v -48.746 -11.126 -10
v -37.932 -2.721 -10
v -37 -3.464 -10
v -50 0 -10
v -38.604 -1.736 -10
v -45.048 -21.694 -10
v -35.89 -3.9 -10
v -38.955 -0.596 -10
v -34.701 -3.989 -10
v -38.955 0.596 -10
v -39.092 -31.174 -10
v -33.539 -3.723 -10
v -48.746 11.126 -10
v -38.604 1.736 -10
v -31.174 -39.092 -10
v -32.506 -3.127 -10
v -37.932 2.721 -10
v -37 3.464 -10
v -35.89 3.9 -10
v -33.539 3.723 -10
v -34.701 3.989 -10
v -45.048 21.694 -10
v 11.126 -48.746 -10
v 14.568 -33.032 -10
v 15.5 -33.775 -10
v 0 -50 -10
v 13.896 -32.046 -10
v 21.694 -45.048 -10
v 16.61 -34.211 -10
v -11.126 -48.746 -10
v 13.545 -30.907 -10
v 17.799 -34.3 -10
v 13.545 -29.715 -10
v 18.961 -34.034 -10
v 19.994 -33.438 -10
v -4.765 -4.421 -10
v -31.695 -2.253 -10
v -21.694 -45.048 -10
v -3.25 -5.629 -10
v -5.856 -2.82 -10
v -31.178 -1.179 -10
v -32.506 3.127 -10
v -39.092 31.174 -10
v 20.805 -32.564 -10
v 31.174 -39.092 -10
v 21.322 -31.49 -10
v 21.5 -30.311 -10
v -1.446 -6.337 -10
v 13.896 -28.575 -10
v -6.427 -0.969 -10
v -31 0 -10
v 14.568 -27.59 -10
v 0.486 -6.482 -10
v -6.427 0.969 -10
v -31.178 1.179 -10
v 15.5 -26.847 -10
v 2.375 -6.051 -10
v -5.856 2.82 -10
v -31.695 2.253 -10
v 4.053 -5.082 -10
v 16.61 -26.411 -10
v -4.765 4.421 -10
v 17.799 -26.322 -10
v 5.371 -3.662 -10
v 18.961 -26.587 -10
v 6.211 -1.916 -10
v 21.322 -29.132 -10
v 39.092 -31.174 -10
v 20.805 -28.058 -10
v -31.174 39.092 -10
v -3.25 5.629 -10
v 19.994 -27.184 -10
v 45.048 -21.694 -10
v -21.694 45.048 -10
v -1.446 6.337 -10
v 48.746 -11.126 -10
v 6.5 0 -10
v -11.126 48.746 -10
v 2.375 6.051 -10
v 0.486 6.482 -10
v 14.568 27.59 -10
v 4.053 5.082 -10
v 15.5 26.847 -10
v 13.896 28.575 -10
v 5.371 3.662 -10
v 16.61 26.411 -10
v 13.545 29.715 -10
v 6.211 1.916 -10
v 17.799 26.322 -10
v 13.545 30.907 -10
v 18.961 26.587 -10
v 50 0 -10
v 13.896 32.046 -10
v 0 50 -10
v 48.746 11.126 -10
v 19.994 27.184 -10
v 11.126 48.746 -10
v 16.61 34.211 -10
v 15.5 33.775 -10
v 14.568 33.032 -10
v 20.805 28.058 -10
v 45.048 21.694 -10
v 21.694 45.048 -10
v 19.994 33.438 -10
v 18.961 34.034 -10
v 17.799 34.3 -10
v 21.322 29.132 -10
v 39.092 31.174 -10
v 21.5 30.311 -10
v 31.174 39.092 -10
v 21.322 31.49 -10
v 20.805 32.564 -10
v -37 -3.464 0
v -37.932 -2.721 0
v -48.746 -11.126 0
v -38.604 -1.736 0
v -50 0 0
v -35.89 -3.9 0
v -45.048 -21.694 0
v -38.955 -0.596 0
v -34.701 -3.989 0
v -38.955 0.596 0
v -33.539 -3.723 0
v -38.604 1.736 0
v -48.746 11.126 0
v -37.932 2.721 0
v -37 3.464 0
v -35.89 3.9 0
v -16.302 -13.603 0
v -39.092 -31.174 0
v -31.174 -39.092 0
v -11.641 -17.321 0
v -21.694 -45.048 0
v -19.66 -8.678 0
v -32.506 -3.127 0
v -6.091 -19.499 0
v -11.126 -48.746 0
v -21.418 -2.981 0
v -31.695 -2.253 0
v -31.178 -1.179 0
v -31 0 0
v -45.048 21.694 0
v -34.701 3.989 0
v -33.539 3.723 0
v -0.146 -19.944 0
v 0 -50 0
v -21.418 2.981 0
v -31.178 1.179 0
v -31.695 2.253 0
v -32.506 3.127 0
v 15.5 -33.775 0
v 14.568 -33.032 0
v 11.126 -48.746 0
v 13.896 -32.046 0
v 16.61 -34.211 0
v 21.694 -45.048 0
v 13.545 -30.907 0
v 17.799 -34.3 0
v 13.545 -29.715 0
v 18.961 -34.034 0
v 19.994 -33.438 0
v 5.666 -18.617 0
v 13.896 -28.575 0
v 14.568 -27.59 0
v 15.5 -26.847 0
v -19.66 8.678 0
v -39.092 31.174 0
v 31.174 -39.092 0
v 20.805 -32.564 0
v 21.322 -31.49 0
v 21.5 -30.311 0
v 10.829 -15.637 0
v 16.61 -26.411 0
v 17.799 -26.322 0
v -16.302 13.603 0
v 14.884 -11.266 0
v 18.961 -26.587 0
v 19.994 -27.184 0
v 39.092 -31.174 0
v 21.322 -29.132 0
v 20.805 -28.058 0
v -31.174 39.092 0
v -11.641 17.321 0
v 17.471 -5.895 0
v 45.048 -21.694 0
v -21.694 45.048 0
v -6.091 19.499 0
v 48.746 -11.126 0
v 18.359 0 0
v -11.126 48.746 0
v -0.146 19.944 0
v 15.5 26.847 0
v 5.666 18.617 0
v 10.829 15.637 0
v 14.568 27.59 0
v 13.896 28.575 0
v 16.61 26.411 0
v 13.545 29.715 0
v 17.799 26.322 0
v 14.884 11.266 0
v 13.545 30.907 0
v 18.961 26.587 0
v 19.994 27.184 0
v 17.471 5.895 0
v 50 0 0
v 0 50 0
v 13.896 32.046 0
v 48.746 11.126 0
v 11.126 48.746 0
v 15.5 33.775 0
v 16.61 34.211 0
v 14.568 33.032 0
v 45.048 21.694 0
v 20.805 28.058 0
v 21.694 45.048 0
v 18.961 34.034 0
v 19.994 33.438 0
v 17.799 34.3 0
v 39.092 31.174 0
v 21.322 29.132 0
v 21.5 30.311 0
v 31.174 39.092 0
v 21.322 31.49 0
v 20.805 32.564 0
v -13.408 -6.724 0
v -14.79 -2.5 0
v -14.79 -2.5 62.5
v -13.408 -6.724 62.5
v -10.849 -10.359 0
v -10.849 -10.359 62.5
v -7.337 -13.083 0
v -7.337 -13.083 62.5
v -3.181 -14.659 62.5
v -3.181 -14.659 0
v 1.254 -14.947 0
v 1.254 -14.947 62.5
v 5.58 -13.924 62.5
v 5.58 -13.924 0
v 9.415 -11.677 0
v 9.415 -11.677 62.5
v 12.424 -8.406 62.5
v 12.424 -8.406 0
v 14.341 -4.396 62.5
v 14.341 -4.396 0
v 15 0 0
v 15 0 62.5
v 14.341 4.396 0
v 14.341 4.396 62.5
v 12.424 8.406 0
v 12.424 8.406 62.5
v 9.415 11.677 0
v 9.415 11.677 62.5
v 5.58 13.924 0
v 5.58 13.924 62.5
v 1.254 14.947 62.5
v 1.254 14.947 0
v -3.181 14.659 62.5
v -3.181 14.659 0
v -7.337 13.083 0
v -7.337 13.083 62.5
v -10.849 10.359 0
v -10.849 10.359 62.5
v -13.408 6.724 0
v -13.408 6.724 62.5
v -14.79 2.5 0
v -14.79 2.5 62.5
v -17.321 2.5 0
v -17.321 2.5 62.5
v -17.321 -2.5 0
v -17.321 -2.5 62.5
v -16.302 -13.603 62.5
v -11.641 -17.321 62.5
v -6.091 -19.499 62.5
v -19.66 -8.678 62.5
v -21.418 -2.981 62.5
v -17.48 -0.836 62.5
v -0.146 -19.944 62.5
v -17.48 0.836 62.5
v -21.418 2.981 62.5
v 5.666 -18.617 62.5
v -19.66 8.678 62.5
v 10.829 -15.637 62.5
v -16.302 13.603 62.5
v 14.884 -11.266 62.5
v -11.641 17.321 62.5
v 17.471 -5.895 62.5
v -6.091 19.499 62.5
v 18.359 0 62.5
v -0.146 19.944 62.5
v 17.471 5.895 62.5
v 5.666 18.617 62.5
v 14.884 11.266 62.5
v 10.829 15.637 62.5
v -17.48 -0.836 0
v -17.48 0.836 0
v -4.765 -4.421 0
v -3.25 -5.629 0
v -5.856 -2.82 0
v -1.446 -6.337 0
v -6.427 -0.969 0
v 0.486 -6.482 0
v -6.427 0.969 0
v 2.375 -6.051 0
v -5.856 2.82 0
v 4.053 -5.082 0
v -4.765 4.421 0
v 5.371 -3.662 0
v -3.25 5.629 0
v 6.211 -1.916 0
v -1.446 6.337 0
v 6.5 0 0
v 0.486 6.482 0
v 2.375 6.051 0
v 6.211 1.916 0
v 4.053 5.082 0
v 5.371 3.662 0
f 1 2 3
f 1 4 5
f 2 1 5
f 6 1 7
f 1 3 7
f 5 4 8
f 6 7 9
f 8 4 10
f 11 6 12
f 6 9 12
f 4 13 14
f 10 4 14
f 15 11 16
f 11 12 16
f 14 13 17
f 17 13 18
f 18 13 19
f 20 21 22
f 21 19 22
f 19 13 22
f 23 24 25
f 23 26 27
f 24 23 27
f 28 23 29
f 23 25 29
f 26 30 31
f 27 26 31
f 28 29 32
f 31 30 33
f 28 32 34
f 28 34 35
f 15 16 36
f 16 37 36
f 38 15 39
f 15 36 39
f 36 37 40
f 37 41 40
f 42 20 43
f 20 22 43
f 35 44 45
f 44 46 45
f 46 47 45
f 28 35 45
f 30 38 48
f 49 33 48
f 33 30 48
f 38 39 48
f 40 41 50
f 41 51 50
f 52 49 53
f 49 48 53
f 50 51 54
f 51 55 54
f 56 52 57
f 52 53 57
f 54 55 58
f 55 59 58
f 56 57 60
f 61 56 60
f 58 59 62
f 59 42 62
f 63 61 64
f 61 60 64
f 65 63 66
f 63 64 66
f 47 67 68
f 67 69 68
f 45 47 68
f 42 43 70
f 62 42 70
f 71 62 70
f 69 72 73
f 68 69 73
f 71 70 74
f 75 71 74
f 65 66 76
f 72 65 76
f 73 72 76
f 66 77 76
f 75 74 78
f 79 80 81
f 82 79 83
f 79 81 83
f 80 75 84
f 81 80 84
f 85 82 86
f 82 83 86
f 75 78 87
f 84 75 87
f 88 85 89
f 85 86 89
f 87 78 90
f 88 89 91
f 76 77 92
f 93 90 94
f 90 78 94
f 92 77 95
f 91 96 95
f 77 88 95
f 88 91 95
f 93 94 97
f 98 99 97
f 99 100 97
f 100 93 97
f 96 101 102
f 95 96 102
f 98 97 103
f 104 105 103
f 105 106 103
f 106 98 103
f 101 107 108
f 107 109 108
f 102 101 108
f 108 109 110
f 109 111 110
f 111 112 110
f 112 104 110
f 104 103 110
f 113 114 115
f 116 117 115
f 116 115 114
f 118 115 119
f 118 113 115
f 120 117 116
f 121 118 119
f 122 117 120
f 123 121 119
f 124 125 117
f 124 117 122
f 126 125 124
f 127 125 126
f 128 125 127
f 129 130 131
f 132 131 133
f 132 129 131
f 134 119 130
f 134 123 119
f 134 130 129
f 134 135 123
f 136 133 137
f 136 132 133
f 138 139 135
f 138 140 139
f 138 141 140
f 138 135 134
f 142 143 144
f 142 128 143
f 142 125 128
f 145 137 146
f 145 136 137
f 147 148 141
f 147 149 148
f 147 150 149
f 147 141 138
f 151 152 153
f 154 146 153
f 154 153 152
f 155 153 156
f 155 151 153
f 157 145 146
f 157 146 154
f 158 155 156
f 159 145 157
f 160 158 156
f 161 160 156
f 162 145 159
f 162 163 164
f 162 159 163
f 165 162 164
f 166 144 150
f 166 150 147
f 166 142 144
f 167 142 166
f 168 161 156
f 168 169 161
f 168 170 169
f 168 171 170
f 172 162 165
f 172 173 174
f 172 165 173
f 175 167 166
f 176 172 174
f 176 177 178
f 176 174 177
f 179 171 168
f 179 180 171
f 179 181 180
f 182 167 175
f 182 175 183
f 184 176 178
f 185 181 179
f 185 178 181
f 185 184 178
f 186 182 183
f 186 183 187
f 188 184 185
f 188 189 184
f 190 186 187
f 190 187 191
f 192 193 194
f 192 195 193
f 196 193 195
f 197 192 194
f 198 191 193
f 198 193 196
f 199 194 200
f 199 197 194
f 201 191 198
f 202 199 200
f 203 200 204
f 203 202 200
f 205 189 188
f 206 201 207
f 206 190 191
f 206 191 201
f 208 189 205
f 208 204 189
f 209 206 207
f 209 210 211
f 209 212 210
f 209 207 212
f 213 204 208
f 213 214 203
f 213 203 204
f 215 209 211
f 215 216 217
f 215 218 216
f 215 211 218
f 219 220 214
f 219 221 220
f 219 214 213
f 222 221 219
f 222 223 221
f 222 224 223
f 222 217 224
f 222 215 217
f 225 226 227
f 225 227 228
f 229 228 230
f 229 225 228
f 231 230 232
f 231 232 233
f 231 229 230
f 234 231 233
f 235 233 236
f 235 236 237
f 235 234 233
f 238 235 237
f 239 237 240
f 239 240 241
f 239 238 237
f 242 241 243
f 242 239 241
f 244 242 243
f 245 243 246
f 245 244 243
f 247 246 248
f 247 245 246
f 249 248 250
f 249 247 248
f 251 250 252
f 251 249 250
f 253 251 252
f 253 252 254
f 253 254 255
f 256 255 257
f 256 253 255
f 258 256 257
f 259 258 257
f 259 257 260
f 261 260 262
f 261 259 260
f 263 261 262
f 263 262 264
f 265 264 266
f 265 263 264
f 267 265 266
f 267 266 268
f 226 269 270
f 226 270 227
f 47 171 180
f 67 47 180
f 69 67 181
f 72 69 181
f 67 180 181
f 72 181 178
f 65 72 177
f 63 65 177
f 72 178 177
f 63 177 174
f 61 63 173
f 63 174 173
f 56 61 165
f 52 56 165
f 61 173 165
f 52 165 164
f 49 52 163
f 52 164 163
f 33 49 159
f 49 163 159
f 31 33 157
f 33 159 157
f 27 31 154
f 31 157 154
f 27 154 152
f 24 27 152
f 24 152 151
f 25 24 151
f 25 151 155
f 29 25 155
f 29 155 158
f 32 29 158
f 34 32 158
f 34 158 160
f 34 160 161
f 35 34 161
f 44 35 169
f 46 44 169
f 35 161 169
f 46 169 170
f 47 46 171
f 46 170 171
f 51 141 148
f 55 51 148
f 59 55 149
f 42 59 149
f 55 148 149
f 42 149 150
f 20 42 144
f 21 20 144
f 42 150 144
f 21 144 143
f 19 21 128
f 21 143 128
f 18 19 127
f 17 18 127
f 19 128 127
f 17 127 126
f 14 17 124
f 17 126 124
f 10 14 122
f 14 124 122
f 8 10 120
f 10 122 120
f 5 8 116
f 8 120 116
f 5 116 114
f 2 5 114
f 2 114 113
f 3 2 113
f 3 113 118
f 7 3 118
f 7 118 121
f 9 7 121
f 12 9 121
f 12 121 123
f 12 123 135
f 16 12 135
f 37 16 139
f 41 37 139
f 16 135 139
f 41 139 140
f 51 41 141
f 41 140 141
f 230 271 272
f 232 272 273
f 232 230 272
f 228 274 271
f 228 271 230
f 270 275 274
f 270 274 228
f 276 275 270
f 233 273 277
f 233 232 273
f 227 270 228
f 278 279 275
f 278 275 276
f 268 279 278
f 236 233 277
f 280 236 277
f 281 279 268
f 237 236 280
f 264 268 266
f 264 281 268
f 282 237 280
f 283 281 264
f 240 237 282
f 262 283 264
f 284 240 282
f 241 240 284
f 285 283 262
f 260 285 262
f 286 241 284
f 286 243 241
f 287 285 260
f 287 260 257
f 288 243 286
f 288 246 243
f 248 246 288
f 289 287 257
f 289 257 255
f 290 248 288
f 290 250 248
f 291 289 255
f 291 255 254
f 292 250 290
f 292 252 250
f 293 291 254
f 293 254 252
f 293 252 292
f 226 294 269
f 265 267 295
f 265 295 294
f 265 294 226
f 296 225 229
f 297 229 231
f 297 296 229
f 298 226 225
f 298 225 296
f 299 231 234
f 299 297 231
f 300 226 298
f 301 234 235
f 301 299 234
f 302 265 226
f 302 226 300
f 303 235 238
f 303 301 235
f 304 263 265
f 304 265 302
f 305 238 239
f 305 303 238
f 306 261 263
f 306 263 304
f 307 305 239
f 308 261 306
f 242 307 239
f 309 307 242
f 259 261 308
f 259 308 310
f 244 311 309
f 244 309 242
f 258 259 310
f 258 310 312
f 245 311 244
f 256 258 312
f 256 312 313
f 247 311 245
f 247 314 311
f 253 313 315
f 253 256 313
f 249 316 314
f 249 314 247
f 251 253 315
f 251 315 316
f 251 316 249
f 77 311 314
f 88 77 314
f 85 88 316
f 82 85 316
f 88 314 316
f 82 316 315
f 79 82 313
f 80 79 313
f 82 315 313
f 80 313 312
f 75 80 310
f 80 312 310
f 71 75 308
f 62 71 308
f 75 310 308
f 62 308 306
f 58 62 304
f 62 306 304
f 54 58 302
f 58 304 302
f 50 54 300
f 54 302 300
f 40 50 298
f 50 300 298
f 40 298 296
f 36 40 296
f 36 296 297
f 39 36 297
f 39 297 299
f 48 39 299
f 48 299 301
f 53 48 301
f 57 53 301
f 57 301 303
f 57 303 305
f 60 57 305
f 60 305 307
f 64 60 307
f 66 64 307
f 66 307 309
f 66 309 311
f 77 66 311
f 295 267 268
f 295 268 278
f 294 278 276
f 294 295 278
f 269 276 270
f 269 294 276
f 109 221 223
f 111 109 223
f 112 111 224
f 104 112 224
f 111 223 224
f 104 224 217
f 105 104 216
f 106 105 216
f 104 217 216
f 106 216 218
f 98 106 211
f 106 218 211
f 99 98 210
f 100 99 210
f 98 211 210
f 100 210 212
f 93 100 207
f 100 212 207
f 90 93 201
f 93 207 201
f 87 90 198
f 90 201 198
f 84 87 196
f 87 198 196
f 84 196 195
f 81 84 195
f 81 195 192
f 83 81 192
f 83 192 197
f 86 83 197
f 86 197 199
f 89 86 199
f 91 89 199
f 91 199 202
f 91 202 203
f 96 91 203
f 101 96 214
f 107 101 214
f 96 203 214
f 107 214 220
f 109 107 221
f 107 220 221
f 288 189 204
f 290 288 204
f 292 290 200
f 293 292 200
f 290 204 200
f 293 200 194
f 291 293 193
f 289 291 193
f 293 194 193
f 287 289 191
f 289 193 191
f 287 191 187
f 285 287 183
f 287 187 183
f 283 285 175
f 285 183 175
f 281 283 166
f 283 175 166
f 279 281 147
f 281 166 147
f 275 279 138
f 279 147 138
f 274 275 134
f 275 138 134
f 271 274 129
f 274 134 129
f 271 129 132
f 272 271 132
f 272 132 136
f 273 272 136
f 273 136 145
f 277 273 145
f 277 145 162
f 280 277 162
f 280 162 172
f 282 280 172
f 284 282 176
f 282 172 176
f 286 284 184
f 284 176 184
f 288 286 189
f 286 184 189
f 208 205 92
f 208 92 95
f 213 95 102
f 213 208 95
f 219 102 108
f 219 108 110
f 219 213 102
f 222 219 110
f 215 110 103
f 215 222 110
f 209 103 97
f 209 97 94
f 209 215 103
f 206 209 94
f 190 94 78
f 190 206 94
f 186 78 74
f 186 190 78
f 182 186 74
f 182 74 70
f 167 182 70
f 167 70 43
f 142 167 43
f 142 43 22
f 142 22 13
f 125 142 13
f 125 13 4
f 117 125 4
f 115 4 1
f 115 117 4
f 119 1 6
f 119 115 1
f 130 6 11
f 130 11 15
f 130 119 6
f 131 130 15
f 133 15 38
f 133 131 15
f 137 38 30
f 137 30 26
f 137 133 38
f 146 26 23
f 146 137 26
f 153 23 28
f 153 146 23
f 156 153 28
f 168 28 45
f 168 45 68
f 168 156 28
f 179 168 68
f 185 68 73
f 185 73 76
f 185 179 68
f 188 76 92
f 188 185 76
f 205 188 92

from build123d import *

# Parameters (mm, degrees)
SKETCH1_R               = 50
BOSS_EXTRUDE1_DEPTH     = 10
SKETCH1_3_R             = 4
CUT_EXTRUDE1_DEPTH      = 10
SKETCH1_4_R             = 20
BOSS_EXTRUDE2_DEPTH     = 62.5
SKETCH3_R               = 6.5
CUT_EXTRUDE3_DEPTH      = 63.5
CUT_EXTRUDE3_DEPTH_BACK = 11


with BuildPart() as part:
    # Sketch1 → Boss-Extrude1 (new body)
    with BuildSketch(Plane.XY):
        Circle(SKETCH1_R)
    extrude(amount=-BOSS_EXTRUDE1_DEPTH)

    # Sketch1<3> → Cut-Extrude1 (cut)
    with BuildSketch(Plane.XY):
        with Locations((-35, 0)):
            Circle(SKETCH1_3_R)
        with Locations((17.5, 30.310889132)):
            Circle(SKETCH1_3_R)
        with Locations((17.5, -30.310889132)):
            Circle(SKETCH1_3_R)
    extrude(amount=-CUT_EXTRUDE1_DEPTH, mode=Mode.SUBTRACT)

    # Sketch1<4> → Boss-Extrude2 (add)
    with BuildSketch(Plane.XY):
        with Locations((-1.640921825, 0)):
            Circle(SKETCH1_4_R)
        with BuildLine():
            ThreePointArc((-17.320508076, 2.5), (-17.5, 0), (-17.320508076, -2.5))
            Line((-17.320508076, -2.5), (-14.790199458, -2.5))
            ThreePointArc((-14.790199458, -2.5), (15, 0), (-14.790199458, 2.5))
            Line((-14.790199458, 2.5), (-17.320508076, 2.5))
        make_face(mode=Mode.SUBTRACT)
    extrude(amount=BOSS_EXTRUDE2_DEPTH)

    # Sketch3 → Cut-Extrude3 (cut, two sides)
    with BuildSketch(Plane.XY) as cut_extrude3_sk:
        Circle(SKETCH3_R)
    extrude(amount=CUT_EXTRUDE3_DEPTH, mode=Mode.SUBTRACT)
    extrude(cut_extrude3_sk.sketch, amount=-CUT_EXTRUDE3_DEPTH_BACK, mode=Mode.SUBTRACT)


solid = part.part
